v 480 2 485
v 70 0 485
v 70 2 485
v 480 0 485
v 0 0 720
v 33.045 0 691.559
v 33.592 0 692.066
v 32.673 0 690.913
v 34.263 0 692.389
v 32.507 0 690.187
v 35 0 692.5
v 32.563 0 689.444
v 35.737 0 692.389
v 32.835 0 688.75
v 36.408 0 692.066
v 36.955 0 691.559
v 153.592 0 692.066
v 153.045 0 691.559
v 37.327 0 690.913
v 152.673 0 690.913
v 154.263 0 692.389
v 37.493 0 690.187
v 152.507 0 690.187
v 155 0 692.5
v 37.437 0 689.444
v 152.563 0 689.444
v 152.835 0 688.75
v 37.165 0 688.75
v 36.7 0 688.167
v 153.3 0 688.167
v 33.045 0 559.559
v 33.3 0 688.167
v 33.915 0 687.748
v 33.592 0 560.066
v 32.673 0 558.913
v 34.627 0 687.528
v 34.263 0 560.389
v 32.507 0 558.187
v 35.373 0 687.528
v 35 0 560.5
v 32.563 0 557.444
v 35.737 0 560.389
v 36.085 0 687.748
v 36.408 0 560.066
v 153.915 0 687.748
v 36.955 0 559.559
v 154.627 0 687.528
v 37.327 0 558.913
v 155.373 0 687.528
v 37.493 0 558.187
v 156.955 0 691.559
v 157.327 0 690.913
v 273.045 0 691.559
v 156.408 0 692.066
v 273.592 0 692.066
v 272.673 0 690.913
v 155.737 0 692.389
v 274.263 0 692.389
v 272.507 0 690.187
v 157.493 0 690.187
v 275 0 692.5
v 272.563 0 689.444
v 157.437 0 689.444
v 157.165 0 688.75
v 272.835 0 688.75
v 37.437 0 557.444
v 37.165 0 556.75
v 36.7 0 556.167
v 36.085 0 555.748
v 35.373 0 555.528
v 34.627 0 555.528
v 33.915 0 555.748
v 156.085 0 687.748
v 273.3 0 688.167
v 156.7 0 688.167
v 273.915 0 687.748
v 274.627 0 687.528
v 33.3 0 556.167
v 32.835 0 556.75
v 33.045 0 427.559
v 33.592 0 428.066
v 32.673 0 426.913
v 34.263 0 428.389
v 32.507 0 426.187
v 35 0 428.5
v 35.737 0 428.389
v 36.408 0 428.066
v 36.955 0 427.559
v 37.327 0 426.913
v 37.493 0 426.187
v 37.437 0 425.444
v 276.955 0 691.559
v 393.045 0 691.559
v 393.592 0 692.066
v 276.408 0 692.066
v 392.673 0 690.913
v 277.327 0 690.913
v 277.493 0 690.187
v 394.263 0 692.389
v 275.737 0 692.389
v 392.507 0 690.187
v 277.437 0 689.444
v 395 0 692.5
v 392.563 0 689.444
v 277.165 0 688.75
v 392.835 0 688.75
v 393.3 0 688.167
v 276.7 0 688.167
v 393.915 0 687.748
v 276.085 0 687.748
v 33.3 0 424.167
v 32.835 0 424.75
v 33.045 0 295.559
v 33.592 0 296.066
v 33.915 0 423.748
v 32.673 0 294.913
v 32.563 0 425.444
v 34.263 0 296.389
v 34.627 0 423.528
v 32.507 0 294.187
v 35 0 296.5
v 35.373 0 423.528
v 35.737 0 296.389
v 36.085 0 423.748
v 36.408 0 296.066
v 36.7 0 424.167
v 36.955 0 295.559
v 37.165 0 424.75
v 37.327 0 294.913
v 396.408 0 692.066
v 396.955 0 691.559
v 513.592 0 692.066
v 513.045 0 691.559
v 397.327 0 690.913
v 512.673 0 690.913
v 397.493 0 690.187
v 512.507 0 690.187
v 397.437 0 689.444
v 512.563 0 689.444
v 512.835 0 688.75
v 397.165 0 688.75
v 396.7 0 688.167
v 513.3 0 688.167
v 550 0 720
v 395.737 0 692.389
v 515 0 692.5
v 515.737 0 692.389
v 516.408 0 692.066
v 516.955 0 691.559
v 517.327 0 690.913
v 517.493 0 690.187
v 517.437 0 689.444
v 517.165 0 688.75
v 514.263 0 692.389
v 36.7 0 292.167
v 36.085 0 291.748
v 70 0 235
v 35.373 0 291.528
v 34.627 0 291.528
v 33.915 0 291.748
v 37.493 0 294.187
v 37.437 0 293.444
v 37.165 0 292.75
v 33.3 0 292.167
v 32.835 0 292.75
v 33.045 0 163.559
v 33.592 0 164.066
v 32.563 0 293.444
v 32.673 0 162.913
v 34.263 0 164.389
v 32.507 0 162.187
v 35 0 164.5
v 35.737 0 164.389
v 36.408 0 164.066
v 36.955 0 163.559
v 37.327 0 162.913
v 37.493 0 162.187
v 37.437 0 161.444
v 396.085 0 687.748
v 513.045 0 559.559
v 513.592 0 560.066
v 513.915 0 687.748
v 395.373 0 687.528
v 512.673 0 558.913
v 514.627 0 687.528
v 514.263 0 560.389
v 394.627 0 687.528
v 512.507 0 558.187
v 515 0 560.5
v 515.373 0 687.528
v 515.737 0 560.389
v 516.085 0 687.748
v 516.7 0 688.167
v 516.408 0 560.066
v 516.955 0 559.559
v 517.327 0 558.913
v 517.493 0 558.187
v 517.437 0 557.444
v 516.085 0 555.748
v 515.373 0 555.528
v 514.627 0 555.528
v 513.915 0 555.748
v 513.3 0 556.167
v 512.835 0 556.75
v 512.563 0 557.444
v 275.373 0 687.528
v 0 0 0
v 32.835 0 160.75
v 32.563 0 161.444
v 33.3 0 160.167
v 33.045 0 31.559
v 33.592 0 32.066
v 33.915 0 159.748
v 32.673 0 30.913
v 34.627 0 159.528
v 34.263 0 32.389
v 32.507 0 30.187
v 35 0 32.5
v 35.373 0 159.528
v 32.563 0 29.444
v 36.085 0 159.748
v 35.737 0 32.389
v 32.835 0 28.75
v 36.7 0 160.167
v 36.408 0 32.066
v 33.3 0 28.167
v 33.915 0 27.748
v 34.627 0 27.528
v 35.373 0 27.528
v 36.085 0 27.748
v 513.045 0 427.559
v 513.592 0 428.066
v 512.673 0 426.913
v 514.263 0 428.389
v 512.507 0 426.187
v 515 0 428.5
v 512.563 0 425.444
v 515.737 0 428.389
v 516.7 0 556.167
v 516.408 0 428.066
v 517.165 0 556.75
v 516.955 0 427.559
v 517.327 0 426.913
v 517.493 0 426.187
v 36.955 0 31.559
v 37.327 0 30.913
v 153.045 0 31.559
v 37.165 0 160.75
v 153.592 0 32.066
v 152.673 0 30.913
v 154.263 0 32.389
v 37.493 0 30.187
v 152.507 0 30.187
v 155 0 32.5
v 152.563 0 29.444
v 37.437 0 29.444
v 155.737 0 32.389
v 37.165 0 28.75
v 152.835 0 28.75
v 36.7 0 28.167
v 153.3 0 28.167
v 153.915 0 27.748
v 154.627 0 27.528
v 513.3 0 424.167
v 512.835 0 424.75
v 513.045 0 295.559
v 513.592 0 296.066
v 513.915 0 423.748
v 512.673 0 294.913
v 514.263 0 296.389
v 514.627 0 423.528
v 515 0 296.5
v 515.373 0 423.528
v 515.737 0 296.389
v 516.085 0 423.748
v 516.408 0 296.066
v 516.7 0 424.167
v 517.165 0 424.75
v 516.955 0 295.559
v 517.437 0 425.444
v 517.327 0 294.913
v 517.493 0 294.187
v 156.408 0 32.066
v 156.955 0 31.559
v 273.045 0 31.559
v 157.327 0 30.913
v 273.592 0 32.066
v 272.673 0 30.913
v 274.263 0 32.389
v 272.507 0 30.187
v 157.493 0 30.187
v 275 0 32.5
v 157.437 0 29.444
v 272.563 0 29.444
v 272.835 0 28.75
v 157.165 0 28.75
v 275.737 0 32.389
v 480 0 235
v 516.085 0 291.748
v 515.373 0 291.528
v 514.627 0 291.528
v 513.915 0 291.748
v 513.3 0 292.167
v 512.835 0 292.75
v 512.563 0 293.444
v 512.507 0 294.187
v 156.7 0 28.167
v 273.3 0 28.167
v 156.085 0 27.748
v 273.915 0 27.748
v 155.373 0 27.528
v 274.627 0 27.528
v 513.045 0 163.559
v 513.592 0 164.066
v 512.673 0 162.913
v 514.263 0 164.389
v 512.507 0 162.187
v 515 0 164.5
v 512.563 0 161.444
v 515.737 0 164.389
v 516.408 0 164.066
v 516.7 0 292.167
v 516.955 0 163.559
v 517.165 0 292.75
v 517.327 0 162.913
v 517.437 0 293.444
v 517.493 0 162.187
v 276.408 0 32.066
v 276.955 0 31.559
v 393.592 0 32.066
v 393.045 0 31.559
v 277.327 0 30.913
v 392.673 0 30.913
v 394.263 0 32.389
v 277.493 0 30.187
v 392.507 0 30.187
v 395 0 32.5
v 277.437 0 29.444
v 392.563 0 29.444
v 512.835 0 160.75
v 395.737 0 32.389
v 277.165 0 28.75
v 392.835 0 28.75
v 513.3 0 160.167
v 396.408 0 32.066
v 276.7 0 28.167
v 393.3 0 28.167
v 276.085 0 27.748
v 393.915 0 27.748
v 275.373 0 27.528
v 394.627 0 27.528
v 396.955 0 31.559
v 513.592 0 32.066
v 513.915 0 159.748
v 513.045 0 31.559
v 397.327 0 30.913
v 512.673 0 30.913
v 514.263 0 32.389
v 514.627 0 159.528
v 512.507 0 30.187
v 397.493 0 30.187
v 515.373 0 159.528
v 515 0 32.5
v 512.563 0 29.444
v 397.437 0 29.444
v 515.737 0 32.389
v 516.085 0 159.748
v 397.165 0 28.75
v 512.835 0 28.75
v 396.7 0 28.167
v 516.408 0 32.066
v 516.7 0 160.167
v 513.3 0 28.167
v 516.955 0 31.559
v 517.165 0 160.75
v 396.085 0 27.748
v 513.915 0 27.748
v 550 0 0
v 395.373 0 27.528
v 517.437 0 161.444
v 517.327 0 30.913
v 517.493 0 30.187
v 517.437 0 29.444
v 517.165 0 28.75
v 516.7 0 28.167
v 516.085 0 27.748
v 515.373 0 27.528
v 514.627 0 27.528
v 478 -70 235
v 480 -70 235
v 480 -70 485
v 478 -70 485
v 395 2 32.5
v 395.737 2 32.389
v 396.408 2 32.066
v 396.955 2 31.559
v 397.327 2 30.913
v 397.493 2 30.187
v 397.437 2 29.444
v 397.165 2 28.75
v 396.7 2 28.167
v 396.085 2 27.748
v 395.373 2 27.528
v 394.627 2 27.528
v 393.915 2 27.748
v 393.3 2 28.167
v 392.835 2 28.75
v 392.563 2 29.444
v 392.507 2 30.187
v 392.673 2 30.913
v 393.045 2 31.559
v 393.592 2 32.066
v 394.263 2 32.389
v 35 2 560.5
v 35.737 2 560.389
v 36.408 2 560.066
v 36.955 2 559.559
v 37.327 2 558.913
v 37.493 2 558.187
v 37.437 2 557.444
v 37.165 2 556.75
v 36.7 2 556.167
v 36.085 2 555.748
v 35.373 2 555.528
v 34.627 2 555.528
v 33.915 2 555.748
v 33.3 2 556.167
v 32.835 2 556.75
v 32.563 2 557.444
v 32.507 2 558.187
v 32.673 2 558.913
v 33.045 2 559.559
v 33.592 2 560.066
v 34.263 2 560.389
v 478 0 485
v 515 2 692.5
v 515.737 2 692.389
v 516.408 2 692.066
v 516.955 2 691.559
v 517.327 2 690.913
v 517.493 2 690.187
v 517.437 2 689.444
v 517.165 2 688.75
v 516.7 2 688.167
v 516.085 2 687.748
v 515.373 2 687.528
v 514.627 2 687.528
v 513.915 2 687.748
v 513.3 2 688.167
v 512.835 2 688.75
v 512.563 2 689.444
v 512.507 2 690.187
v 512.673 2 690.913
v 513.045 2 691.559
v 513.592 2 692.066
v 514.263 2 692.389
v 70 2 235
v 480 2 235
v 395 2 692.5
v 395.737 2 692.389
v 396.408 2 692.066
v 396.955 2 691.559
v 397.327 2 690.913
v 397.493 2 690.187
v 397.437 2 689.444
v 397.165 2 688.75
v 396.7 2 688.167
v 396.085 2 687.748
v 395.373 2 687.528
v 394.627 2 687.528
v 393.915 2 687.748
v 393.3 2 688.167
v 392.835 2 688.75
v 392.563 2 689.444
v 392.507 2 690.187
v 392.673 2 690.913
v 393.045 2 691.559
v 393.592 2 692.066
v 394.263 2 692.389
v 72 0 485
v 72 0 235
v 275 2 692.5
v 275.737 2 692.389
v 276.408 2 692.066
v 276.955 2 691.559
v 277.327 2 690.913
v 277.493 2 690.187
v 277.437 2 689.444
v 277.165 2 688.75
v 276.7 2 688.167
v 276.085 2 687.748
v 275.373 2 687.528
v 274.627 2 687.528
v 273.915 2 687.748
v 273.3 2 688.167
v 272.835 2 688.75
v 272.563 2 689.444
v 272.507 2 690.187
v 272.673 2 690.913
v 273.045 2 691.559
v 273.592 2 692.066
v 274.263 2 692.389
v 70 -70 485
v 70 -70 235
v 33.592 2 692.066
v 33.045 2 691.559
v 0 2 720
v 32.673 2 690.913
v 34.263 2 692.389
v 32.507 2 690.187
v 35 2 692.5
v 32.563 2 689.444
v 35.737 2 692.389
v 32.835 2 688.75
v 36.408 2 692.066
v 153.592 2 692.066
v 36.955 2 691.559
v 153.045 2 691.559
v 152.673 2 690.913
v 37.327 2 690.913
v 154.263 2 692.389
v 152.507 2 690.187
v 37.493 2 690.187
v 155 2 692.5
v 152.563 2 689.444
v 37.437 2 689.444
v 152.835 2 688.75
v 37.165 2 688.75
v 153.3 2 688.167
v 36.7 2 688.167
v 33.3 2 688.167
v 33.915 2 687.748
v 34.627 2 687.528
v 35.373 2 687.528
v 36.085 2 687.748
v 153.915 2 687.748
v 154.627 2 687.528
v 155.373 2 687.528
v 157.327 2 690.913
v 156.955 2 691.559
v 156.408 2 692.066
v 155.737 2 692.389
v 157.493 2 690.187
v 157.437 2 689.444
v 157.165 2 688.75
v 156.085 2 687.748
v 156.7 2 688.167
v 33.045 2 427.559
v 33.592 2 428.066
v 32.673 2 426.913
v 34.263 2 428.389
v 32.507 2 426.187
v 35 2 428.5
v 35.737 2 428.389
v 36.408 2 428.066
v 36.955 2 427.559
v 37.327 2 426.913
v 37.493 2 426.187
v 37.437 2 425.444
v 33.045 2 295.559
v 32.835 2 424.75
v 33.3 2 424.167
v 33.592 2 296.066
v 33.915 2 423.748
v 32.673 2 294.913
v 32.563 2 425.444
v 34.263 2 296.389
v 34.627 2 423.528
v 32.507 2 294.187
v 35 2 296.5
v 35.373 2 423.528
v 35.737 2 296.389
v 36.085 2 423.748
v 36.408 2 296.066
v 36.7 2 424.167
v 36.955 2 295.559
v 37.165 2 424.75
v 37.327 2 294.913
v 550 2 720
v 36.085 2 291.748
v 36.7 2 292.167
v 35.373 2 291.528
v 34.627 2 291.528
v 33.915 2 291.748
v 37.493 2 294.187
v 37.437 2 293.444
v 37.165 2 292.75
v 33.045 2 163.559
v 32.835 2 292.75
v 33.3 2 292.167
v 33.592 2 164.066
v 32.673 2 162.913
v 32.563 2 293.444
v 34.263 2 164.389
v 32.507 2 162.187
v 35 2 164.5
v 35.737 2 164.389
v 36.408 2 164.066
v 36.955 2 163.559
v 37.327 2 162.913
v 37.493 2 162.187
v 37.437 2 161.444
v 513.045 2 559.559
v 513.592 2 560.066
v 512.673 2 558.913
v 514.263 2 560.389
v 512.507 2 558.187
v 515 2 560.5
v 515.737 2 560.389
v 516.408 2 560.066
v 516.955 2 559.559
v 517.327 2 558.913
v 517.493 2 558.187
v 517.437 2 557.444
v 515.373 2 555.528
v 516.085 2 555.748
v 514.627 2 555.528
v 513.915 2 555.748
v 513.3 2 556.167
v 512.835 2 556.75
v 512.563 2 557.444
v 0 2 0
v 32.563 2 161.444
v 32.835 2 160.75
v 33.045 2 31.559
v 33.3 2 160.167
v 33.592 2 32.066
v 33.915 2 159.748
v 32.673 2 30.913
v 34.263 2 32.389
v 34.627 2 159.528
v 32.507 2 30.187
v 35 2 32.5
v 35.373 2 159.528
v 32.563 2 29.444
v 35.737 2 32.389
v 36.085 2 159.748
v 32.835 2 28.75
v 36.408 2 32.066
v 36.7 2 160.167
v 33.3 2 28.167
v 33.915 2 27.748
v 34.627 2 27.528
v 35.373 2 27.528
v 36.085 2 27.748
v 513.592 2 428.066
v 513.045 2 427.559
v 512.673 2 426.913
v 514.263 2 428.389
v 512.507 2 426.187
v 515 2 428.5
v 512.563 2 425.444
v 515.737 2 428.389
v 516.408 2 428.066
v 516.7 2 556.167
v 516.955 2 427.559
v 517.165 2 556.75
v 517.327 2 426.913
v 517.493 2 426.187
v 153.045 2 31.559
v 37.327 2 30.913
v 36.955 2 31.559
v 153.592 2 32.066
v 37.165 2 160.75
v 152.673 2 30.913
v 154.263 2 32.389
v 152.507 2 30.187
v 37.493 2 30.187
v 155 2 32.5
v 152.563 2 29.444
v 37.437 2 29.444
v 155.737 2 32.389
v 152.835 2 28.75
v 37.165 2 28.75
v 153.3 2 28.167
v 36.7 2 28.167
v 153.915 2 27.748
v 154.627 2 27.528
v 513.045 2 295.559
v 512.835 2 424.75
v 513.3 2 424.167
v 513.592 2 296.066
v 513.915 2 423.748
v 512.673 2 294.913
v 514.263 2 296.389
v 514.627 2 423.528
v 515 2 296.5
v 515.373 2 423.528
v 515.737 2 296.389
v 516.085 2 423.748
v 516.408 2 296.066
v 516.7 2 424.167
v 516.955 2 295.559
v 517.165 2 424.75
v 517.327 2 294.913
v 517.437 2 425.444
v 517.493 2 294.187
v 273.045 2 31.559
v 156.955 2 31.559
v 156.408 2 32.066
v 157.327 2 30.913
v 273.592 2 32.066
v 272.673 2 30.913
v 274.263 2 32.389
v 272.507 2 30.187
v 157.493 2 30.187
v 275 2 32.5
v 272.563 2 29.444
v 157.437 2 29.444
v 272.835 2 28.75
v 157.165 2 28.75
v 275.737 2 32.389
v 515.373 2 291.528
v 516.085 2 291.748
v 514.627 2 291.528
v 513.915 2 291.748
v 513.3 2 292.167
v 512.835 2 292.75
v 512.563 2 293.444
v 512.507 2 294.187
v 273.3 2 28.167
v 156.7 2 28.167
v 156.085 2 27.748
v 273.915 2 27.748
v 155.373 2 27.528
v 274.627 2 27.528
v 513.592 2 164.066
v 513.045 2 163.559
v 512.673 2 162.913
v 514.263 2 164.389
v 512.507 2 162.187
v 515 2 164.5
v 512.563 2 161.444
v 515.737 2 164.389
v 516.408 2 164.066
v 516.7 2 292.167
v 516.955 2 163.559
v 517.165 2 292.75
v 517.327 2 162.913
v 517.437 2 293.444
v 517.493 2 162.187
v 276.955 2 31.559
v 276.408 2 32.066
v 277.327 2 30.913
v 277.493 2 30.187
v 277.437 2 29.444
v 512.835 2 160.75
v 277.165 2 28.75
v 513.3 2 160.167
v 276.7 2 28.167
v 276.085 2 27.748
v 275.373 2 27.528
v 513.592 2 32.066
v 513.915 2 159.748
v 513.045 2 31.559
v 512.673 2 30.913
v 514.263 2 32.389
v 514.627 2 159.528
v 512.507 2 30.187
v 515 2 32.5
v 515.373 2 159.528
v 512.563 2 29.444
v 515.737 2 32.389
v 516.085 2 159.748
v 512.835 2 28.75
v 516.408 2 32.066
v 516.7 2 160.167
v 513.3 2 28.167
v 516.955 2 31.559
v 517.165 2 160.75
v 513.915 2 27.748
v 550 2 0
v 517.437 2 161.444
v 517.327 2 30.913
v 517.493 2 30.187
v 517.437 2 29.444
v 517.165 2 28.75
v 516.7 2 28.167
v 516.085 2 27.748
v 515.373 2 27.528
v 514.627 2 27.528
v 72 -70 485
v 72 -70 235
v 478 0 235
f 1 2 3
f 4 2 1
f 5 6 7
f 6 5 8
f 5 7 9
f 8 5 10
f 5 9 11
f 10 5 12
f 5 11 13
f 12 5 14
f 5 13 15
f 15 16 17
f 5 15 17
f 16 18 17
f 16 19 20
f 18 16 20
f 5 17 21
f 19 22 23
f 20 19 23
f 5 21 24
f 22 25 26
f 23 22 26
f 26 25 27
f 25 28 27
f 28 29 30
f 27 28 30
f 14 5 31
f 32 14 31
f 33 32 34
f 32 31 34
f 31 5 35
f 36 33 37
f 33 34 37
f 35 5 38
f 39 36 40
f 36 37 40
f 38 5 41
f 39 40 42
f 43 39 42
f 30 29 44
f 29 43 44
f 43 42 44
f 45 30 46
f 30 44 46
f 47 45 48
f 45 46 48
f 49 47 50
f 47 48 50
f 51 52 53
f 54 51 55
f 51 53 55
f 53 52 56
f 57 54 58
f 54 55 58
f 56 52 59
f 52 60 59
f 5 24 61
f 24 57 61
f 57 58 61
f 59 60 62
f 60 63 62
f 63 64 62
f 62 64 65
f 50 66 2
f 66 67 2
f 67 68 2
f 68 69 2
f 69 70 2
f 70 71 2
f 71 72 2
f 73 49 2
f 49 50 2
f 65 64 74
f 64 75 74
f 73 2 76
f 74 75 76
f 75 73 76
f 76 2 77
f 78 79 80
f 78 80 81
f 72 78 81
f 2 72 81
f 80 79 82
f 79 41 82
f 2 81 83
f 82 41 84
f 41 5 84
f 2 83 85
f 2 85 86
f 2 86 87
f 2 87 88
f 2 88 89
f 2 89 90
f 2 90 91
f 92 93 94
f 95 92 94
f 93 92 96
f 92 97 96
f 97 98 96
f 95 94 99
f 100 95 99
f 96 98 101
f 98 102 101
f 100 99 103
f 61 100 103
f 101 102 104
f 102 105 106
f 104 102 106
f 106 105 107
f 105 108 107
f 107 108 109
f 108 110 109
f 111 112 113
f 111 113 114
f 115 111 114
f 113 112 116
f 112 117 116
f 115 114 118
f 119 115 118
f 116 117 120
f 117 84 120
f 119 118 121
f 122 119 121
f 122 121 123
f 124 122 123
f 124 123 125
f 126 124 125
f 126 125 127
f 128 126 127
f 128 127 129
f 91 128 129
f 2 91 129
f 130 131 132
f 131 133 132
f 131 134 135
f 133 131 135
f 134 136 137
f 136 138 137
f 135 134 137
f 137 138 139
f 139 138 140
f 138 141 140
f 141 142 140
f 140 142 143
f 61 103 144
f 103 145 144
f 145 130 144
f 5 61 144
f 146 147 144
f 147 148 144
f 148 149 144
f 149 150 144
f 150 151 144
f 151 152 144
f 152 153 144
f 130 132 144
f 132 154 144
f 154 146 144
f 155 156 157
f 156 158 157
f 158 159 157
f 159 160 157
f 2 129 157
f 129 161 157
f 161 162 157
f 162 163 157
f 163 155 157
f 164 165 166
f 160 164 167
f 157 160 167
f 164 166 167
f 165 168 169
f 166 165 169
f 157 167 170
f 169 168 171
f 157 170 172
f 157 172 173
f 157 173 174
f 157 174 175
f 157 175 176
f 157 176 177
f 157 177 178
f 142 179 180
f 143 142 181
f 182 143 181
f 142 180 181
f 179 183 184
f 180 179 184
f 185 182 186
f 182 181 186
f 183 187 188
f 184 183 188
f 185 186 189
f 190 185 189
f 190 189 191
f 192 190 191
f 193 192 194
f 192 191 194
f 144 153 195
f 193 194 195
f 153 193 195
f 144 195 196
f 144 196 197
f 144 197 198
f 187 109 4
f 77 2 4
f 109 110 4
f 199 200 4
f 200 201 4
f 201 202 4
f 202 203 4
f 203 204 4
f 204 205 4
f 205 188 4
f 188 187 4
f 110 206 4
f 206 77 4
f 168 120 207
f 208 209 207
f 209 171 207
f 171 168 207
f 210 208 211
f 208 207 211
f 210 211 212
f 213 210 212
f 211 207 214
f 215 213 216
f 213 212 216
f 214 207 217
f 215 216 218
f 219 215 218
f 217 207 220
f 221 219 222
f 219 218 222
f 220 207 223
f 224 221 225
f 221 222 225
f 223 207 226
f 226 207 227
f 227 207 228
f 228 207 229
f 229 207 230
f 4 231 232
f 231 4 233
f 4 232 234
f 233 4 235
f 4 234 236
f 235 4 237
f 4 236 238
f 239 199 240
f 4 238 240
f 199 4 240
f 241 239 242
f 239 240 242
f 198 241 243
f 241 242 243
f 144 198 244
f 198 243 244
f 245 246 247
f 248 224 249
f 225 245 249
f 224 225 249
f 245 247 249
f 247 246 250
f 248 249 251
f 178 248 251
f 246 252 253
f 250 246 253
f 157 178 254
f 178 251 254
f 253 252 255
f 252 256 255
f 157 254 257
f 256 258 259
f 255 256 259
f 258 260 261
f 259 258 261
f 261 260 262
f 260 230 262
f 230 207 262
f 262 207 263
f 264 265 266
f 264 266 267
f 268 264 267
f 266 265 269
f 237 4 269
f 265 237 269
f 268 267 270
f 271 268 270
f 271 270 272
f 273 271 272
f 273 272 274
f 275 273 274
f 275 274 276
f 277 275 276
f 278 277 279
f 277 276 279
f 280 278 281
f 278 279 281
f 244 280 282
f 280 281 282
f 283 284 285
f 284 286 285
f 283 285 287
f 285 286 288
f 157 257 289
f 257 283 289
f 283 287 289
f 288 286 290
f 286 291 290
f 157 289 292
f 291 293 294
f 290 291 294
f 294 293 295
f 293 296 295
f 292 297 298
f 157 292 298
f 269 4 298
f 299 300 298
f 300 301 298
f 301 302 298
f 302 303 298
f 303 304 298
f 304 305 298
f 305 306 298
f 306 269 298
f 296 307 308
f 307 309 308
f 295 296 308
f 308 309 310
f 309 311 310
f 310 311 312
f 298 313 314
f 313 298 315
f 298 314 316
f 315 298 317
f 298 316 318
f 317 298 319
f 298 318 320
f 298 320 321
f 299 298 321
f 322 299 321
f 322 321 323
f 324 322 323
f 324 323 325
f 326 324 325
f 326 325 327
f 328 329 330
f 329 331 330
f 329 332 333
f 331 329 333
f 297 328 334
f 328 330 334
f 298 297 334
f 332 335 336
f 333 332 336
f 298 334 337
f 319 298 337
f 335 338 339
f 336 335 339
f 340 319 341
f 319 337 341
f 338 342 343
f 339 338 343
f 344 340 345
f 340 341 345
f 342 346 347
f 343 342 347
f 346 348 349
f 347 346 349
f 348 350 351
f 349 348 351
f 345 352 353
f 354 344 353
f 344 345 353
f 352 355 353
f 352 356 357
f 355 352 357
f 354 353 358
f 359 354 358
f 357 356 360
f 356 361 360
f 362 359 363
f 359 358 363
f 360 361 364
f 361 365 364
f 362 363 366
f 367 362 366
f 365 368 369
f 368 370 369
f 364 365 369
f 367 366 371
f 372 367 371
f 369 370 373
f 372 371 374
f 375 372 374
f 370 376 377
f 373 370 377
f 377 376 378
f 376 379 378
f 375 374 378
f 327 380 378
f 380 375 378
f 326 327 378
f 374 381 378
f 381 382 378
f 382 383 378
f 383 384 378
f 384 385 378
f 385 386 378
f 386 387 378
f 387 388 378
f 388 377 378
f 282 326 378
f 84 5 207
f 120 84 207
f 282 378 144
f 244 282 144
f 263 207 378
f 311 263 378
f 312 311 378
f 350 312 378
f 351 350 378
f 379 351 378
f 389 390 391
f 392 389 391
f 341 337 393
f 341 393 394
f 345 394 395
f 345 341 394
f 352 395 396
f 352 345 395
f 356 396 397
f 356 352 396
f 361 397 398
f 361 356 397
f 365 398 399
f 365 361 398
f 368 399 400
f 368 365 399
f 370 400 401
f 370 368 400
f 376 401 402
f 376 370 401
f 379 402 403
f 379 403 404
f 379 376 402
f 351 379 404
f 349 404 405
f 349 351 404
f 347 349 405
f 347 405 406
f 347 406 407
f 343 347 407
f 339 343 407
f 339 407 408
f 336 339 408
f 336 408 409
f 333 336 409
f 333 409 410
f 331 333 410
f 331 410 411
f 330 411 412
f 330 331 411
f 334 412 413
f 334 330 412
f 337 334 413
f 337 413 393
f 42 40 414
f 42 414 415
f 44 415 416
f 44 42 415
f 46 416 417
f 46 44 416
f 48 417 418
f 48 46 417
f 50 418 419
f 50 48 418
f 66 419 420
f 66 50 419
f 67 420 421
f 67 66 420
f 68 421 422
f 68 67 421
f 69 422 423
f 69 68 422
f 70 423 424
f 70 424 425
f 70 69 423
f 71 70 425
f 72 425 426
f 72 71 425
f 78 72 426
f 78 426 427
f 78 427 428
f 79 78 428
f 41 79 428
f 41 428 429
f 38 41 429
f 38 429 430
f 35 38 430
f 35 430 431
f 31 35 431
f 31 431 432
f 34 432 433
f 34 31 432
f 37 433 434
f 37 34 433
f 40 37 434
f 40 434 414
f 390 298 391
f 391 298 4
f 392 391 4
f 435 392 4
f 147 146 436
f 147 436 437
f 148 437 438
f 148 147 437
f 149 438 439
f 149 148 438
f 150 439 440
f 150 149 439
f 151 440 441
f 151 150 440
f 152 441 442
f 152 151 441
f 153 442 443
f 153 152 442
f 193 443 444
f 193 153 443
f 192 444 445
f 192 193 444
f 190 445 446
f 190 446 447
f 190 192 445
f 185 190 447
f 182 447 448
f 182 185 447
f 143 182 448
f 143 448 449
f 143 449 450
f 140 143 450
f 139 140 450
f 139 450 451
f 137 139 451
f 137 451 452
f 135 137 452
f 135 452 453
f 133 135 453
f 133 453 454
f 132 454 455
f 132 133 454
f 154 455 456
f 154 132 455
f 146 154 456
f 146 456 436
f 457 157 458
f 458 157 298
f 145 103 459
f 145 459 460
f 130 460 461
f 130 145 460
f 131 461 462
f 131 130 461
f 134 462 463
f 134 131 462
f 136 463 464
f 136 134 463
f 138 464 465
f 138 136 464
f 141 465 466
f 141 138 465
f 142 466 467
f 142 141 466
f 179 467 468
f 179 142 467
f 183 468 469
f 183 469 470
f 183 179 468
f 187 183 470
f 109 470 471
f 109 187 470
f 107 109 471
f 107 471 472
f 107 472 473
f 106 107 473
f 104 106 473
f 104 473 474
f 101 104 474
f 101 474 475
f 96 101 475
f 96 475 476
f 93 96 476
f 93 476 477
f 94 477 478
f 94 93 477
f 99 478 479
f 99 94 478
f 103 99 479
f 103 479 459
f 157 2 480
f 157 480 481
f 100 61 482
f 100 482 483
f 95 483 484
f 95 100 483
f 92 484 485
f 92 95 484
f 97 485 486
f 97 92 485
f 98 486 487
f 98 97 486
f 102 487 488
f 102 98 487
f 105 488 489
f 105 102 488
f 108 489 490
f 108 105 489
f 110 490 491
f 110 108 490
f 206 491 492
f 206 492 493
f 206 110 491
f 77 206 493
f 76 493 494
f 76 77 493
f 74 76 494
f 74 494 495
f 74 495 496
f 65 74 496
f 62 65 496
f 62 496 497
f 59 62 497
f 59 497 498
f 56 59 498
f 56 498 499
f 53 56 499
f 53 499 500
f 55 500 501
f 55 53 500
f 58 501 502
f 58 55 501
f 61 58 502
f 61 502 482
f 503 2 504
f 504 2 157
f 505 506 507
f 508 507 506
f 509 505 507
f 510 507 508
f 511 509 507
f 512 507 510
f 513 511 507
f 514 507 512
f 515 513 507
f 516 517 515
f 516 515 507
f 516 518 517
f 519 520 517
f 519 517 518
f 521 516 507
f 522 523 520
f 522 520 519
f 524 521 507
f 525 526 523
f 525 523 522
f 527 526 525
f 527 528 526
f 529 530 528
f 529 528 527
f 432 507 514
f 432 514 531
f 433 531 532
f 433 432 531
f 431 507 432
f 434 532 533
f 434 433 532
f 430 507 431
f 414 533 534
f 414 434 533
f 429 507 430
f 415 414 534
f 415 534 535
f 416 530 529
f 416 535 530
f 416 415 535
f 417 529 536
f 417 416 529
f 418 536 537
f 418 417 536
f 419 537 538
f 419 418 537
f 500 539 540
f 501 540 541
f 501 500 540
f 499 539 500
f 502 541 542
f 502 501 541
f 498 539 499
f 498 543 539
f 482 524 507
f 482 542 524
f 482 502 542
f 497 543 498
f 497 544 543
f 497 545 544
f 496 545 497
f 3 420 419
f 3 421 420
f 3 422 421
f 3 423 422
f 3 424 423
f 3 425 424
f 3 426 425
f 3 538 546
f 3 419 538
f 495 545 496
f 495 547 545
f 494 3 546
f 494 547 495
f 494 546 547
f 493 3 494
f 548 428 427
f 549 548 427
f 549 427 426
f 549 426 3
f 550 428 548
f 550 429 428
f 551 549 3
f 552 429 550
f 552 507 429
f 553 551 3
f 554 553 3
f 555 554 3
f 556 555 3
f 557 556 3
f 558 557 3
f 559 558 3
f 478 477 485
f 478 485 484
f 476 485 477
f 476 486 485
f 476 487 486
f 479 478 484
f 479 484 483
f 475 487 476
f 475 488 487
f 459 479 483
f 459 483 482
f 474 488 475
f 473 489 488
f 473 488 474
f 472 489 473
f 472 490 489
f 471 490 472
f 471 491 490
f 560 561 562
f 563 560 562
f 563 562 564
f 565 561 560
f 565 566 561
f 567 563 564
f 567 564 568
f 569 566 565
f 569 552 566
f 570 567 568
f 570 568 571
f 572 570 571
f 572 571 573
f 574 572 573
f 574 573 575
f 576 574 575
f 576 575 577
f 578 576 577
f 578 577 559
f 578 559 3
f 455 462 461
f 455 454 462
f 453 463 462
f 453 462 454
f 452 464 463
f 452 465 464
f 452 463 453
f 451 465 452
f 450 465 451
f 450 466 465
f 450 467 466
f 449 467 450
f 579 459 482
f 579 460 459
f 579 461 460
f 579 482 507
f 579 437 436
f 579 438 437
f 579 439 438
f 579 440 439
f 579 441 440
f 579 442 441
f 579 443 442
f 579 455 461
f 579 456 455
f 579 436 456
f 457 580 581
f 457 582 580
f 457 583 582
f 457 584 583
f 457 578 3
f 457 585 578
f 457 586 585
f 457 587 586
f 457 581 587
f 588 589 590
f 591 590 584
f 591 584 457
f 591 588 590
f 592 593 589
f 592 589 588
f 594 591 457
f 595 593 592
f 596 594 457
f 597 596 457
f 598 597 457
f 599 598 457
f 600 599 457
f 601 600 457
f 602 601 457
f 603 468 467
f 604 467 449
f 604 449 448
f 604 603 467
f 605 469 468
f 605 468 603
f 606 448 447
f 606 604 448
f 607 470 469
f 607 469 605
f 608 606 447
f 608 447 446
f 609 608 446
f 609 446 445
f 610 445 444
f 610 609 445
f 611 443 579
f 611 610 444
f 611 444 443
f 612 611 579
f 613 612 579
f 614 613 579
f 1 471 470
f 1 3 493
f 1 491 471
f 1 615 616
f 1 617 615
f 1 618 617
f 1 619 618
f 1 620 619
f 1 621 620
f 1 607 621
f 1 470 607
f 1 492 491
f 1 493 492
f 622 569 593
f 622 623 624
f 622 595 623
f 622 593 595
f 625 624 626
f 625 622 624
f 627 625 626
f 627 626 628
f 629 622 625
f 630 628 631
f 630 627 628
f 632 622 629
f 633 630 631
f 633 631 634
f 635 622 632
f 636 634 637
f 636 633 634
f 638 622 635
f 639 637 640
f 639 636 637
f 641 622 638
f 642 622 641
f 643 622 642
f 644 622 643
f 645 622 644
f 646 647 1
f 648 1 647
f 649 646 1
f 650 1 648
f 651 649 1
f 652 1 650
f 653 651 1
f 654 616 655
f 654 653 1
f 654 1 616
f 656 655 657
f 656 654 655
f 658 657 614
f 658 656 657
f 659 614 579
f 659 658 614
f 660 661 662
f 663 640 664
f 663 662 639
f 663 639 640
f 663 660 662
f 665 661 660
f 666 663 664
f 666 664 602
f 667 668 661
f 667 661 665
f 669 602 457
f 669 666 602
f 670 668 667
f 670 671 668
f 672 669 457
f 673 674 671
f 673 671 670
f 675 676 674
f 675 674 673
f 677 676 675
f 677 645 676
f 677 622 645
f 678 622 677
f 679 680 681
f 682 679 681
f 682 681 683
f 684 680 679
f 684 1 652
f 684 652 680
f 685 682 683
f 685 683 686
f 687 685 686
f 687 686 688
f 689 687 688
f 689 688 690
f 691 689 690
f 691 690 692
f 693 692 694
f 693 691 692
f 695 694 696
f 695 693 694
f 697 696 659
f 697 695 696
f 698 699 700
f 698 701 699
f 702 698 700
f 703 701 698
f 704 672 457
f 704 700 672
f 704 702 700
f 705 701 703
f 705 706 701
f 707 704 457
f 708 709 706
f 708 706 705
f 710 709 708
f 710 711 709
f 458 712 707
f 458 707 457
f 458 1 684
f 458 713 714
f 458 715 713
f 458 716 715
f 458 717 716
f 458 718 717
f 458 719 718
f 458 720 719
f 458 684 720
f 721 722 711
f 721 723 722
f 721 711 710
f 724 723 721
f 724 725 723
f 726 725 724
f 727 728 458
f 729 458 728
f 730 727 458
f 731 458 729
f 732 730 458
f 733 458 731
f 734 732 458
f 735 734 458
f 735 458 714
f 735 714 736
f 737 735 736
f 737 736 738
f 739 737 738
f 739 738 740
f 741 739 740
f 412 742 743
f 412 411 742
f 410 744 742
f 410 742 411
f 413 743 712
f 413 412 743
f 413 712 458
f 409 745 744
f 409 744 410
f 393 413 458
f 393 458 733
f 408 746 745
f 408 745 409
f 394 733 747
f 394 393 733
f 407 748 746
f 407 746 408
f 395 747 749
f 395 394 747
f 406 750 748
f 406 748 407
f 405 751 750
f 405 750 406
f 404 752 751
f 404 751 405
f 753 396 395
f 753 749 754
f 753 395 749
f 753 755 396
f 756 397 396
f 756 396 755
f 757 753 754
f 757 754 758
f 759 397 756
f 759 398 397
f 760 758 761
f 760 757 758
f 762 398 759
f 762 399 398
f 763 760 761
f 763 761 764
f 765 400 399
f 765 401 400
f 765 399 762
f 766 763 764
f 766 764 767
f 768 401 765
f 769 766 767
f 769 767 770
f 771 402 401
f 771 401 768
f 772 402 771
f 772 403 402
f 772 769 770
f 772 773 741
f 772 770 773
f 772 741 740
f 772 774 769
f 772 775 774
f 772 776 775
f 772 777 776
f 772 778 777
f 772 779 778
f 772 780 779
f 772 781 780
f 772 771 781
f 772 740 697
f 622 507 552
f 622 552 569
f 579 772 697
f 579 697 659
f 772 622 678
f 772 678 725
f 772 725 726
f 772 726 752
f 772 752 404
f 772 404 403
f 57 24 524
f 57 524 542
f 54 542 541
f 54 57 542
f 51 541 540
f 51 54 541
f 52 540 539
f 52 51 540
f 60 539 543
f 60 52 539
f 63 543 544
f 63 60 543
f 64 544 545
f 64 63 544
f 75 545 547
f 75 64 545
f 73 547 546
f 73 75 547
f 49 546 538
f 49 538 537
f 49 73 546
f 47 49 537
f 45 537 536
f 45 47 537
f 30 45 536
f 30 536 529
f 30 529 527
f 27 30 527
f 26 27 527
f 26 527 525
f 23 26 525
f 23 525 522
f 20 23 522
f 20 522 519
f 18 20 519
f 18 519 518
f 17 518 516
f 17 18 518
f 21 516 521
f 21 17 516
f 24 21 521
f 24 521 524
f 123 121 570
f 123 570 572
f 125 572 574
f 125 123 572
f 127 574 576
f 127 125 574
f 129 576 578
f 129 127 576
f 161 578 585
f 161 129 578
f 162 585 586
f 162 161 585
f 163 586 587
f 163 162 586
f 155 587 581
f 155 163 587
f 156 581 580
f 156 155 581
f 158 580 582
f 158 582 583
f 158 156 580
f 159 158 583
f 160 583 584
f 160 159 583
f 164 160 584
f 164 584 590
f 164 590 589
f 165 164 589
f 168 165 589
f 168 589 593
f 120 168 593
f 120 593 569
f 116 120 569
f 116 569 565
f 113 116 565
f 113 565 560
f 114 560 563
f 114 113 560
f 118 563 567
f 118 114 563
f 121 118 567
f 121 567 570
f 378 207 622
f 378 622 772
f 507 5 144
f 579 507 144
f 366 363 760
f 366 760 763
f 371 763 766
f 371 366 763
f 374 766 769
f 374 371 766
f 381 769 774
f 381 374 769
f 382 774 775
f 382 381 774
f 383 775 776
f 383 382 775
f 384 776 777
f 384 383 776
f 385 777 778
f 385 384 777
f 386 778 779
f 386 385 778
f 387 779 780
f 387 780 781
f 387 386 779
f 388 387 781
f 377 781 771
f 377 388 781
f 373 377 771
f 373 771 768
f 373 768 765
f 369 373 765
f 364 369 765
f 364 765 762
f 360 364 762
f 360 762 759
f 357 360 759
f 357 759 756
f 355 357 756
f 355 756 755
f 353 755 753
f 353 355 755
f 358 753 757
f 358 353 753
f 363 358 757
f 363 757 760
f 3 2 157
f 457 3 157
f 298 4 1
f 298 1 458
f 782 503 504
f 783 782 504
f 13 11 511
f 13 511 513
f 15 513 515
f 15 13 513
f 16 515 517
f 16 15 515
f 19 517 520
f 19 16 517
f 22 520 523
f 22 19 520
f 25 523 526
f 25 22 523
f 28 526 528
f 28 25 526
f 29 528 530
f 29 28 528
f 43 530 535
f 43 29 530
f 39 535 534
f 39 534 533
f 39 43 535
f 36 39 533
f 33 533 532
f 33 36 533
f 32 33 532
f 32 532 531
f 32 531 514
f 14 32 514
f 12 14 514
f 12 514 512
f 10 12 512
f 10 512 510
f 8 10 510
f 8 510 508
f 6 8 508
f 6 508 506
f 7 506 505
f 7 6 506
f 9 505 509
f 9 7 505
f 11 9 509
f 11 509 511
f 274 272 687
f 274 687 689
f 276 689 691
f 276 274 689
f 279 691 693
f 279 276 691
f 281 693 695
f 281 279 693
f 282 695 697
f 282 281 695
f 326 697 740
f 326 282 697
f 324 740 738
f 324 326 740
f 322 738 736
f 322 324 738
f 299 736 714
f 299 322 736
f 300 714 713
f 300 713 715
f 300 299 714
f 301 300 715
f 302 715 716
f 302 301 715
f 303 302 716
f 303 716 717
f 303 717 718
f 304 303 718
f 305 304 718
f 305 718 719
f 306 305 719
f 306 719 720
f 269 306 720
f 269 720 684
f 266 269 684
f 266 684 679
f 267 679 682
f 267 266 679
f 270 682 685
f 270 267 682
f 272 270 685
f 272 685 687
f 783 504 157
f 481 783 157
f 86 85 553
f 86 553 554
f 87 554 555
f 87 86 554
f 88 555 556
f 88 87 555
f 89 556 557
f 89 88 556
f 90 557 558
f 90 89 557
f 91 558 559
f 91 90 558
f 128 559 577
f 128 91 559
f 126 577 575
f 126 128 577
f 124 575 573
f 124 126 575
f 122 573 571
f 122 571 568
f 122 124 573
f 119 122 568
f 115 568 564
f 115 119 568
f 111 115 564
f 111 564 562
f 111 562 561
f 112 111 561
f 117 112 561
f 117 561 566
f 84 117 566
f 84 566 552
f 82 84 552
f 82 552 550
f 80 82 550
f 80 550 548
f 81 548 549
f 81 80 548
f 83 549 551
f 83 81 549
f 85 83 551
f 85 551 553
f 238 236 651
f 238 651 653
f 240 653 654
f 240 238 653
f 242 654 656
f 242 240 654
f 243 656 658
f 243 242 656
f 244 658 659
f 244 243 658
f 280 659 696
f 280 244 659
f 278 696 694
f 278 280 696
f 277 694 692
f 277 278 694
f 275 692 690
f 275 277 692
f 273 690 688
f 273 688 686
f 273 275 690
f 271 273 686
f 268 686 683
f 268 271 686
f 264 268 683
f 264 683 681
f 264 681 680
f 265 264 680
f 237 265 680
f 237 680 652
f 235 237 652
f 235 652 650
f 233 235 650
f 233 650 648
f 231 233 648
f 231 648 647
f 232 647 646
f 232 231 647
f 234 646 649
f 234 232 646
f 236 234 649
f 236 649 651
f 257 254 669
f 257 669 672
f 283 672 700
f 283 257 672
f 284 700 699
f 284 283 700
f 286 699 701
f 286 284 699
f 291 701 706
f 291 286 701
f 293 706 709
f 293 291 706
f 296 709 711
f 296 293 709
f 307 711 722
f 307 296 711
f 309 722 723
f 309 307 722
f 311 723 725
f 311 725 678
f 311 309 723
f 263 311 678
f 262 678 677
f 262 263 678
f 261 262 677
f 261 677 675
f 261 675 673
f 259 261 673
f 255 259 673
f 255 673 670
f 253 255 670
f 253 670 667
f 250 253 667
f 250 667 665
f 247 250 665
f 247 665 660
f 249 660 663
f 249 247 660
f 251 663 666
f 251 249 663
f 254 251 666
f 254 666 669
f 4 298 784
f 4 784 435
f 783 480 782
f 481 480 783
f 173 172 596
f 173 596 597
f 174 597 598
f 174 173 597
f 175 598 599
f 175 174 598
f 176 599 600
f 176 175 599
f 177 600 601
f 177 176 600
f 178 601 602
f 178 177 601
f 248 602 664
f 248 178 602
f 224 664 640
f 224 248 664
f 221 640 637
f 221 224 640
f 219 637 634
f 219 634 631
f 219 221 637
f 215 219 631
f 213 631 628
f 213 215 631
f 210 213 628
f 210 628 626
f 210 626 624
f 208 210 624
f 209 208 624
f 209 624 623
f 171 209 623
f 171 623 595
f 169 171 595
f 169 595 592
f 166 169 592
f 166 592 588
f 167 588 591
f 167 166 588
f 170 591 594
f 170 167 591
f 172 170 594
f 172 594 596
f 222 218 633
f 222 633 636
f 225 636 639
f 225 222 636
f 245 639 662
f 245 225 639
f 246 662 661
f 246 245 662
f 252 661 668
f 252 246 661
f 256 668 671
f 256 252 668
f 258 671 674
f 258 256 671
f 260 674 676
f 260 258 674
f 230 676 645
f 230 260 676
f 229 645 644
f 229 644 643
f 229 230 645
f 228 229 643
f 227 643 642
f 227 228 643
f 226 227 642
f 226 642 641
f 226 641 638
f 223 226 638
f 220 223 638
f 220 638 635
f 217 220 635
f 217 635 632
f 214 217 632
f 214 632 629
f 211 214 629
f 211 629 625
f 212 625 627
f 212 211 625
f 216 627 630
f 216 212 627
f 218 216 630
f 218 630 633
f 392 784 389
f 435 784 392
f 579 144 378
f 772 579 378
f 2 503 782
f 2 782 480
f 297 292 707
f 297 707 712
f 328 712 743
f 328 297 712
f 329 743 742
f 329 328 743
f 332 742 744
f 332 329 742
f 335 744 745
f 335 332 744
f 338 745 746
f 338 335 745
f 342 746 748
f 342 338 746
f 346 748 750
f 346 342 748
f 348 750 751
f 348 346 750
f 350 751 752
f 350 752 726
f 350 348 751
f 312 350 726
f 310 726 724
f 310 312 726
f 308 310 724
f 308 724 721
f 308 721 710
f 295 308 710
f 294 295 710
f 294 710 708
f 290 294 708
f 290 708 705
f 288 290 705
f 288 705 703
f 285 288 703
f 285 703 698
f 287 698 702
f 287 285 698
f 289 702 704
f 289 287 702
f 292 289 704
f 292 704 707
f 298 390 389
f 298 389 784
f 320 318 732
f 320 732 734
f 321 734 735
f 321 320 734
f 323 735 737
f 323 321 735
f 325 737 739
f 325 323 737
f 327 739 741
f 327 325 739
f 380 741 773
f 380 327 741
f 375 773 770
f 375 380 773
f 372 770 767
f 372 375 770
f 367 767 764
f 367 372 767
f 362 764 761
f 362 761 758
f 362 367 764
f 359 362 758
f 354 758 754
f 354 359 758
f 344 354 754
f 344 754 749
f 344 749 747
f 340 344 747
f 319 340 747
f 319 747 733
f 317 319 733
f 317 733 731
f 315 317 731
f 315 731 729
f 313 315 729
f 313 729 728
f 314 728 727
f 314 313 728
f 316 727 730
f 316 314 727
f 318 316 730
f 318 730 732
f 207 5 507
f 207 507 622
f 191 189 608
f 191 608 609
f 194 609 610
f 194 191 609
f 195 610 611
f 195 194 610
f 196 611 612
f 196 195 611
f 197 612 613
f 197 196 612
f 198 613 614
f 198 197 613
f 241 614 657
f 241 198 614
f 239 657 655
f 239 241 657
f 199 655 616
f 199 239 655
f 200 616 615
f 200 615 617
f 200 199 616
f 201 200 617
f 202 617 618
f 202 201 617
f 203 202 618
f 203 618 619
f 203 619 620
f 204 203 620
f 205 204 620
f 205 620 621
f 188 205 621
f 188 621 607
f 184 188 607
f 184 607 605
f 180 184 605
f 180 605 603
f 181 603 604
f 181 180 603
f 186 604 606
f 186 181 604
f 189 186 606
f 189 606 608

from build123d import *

# Parameters (mm, degrees)
SKETCH3_W           = 550
SKETCH3_H           = 720
SKETCH3_R           = 2.5
SKETCH3_W_2         = 410
SKETCH3_H_2         = 250
BOSS_EXTRUDE2_DEPTH = 2
SKETCH5_W           = 250
SKETCH5_H           = 70
BOSS_EXTRUDE3_DEPTH = 2
SKETCH6_W           = 250
SKETCH6_H           = 70
BOSS_EXTRUDE4_DEPTH = 2


with BuildPart() as part:
    # Sketch3 → Boss-Extrude2 (new body)
    with BuildSketch(Plane(origin=(0, 0, 0), x_dir=(1, 0, 0), z_dir=(0, 1, 0))):
        with Locations((275, -360)):
            Rectangle(SKETCH3_W, SKETCH3_H)
        with Locations(Location((35, -30, 0), (0, 0, 270))):
            Circle(SKETCH3_R, mode=Mode.SUBTRACT)
        with Locations(Location((35, -162, 0), (0, 0, 270))):
            Circle(SKETCH3_R, mode=Mode.SUBTRACT)
        with Locations(Location((35, -294, 0), (0, 0, 270))):
            Circle(SKETCH3_R, mode=Mode.SUBTRACT)
        with Locations(Location((35, -426, 0), (0, 0, 270))):
            Circle(SKETCH3_R, mode=Mode.SUBTRACT)
        with Locations(Location((35, -558, 0), (0, 0, 270))):
            Circle(SKETCH3_R, mode=Mode.SUBTRACT)
        with Locations(Location((35, -690, 0), (0, 0, 270))):
            Circle(SKETCH3_R, mode=Mode.SUBTRACT)
        with Locations(Location((275, -30, 0), (0, 0, 270))):
            Circle(SKETCH3_R, mode=Mode.SUBTRACT)
        with Locations(Location((155, -30, 0), (0, 0, 270))):
            Circle(SKETCH3_R, mode=Mode.SUBTRACT)
        with Locations(Location((395, -30, 0), (0, 0, 270))):
            Circle(SKETCH3_R, mode=Mode.SUBTRACT)
        with Locations(Location((155, -690, 0), (0, 0, 270))):
            Circle(SKETCH3_R, mode=Mode.SUBTRACT)
        with Locations(Location((275, -690, 0), (0, 0, 270))):
            Circle(SKETCH3_R, mode=Mode.SUBTRACT)
        with Locations(Location((395, -690, 0), (0, 0, 270))):
            Circle(SKETCH3_R, mode=Mode.SUBTRACT)
        with Locations(Location((515, -690, 0), (0, 0, 270))):
            Circle(SKETCH3_R, mode=Mode.SUBTRACT)
        with Locations(Location((515, -558, 0), (0, 0, 270))):
            Circle(SKETCH3_R, mode=Mode.SUBTRACT)
        with Locations(Location((515, -426, 0), (0, 0, 270))):
            Circle(SKETCH3_R, mode=Mode.SUBTRACT)
        with Locations(Location((515, -294, 0), (0, 0, 270))):
            Circle(SKETCH3_R, mode=Mode.SUBTRACT)
        with Locations(Location((515, -162, 0), (0, 0, 270))):
            Circle(SKETCH3_R, mode=Mode.SUBTRACT)
        with Locations(Location((515, -30, 0), (0, 0, 270))):
            Circle(SKETCH3_R, mode=Mode.SUBTRACT)
        with Locations((275, -360)):
            Rectangle(SKETCH3_W_2, SKETCH3_H_2, mode=Mode.SUBTRACT)
    extrude(amount=BOSS_EXTRUDE2_DEPTH)


with BuildPart() as body_2:
    # Sketch5 → Boss-Extrude3 (new body)
    with BuildSketch(Plane(origin=(70, 0, 0), x_dir=(0, 0, -1), z_dir=(1, 0, 0))):
        with Locations((-360, -35)):
            Rectangle(SKETCH5_W, SKETCH5_H)
    extrude(amount=BOSS_EXTRUDE3_DEPTH)


with BuildPart() as body_3:
    # Sketch6 → Boss-Extrude4 (new body)
    with BuildSketch(Plane.ZY.offset(-480)):
        with Locations((360, -35)):
            Rectangle(SKETCH6_W, SKETCH6_H)
    extrude(amount=BOSS_EXTRUDE4_DEPTH)


solid = Compound([part.part, body_2.part, body_3.part])
